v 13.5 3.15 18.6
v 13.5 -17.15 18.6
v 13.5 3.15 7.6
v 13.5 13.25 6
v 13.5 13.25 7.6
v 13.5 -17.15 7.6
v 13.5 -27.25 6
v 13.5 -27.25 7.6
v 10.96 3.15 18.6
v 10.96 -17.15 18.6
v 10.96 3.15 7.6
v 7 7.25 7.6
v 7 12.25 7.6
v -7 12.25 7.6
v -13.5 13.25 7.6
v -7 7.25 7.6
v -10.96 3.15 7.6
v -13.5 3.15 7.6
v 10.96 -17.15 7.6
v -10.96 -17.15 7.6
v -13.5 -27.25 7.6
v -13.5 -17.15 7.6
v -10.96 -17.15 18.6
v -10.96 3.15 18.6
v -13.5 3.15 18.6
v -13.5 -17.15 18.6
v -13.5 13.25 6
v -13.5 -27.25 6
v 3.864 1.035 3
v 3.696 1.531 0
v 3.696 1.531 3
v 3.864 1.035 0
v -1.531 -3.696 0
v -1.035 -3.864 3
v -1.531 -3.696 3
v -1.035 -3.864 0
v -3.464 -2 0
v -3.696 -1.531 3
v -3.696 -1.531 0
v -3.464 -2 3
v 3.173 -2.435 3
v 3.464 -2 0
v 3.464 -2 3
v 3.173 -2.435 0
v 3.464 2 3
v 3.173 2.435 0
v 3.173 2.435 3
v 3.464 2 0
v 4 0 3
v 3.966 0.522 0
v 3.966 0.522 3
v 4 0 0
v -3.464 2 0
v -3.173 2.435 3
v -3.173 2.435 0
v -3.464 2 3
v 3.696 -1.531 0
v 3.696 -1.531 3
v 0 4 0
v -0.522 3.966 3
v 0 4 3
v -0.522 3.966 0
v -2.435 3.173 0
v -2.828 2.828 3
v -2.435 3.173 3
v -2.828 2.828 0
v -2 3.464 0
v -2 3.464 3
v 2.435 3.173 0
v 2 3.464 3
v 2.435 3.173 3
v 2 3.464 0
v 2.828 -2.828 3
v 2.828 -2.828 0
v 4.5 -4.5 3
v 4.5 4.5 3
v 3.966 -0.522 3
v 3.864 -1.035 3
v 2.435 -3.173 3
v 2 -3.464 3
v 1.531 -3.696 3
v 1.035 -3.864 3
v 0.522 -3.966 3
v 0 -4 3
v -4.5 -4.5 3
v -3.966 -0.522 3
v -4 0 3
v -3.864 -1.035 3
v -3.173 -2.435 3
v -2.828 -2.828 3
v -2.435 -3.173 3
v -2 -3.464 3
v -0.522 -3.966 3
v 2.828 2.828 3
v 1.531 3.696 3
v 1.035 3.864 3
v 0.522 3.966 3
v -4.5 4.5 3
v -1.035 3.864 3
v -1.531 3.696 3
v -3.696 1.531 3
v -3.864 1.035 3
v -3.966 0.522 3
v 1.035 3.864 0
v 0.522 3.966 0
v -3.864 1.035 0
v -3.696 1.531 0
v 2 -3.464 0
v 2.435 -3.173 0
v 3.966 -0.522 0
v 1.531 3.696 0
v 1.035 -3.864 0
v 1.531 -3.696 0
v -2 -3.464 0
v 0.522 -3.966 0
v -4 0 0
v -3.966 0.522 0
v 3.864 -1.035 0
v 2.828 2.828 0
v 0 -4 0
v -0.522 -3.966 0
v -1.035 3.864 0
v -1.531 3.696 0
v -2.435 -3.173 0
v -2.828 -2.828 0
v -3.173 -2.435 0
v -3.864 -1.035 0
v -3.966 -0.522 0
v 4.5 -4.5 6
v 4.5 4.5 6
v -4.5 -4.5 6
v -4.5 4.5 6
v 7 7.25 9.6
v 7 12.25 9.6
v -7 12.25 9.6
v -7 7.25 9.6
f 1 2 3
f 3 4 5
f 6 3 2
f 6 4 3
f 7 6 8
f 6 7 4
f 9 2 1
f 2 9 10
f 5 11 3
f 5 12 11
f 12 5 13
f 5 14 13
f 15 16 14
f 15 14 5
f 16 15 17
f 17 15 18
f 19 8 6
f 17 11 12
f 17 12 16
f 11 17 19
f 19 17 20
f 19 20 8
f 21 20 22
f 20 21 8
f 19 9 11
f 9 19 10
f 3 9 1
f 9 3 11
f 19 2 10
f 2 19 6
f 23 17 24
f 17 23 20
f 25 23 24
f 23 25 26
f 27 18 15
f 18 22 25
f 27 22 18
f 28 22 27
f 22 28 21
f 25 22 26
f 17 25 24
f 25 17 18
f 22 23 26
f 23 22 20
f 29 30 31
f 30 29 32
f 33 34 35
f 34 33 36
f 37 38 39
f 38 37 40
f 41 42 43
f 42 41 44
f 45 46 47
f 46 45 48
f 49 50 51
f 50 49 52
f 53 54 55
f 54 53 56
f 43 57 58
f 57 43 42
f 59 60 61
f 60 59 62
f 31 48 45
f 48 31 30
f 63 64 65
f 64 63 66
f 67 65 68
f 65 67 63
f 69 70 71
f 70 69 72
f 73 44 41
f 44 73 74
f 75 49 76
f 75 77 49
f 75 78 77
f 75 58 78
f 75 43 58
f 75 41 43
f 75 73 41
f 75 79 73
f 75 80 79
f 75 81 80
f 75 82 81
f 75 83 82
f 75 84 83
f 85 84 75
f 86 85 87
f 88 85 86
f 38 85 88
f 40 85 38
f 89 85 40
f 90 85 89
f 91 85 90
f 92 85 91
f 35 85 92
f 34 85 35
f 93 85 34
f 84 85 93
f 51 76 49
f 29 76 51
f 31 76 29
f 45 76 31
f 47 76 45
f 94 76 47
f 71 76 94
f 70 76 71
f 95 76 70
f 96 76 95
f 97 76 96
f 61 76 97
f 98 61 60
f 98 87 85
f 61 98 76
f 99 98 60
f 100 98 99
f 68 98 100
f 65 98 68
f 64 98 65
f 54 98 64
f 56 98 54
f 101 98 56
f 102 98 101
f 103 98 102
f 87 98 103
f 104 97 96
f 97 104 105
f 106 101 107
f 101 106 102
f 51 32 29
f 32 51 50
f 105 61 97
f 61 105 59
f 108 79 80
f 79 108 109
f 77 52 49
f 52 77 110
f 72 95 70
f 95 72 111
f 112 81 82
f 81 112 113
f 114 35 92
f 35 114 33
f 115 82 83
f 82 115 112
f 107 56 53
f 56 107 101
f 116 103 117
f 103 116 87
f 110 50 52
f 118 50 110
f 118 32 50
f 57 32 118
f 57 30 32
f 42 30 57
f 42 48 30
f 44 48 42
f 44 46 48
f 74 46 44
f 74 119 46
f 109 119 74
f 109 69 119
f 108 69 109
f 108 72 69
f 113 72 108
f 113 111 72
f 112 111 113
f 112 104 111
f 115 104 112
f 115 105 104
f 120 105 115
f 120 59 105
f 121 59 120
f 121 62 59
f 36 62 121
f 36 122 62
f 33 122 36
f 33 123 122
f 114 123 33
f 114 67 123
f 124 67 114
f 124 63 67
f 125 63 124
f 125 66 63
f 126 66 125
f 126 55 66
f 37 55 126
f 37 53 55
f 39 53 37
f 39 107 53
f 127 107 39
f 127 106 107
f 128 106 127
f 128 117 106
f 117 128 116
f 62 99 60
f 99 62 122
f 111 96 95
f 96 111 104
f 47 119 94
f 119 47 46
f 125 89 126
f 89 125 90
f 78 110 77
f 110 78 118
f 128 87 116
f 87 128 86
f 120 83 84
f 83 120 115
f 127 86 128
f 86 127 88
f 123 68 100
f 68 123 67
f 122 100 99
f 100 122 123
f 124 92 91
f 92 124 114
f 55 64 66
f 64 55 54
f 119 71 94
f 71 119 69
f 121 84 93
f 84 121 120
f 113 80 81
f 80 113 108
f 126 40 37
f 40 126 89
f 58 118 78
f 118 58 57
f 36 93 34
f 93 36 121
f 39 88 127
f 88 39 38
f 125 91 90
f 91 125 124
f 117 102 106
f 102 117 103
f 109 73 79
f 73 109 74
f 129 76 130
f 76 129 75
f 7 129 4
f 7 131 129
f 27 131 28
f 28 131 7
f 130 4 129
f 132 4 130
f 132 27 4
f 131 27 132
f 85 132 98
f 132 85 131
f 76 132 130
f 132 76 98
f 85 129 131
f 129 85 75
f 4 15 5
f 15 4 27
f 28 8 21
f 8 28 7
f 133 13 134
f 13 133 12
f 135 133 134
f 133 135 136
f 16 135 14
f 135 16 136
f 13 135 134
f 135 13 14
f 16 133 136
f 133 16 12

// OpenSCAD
// ============================================================================
// esp32cam_001.scad — Board ESP32-CAM AI-Thinker (MOCK THAM CHIẾU — không in)
// ----------------------------------------------------------------------------
// Biến thể thay cho XIAO ESP32-S3: dùng với nắp adapter top_cap_esp32cam.
// Tư thế LẮP: camera úp XUỐNG (−Z) → 2 hàng pin header chĩa LÊN (+Z).
// GỐC CỤC BỘ: tâm mặt dưới barrel LENS = [0,0,0] (giống convention xiao mock).
// Lens OV2640 lệch tâm PCB e32_lens_off dọc trục dài — ⚠️ đo lại board thật.
// Lens barrel VẶN CHỈNH NÉT được (khác lens XIAO cố định — chỉnh về ~36mm).
// ============================================================================
include <../constants.scad>

module esp32cam() {
    // Barrel lens (nhìn xuống −Z, mặt dưới tại z=0)
    color(col_metal) cylinder(d = e32_lens_d, h = 3, $fn = 48);
    // Khối module camera
    color([0.15, 0.15, 0.15])
        translate([-e32_cam_blk/2, -e32_cam_blk/2, 3]) cube([e32_cam_blk, e32_cam_blk, 3]);
    // PCB (tâm PCB lệch −e32_lens_off theo Y so với lens)
    color(col_pcb)
        translate([-e32_pcb_w/2, -e32_pcb_l/2 - e32_lens_off, 6])
            cube([e32_pcb_w, e32_pcb_l, e32_pcb_t]);
    // 2 hàng pin header 8 chân chĩa LÊN dọc 2 cạnh dài
    color(col_metal)
        for (sx = [1, -1])
            translate([sx * (e32_pcb_w/2 - 1.27) - 1.27, -17.15, 6 + e32_pcb_t])
                cube([2.54, 20.3, e32_hdr_h]);
    // Gợi khe microSD ở đầu +Y
    color(col_metal)
        translate([-7, e32_pcb_l/2 - e32_lens_off - 6, 6 + e32_pcb_t])
            cube([14, 5, 2]);
}

esp32cam();
